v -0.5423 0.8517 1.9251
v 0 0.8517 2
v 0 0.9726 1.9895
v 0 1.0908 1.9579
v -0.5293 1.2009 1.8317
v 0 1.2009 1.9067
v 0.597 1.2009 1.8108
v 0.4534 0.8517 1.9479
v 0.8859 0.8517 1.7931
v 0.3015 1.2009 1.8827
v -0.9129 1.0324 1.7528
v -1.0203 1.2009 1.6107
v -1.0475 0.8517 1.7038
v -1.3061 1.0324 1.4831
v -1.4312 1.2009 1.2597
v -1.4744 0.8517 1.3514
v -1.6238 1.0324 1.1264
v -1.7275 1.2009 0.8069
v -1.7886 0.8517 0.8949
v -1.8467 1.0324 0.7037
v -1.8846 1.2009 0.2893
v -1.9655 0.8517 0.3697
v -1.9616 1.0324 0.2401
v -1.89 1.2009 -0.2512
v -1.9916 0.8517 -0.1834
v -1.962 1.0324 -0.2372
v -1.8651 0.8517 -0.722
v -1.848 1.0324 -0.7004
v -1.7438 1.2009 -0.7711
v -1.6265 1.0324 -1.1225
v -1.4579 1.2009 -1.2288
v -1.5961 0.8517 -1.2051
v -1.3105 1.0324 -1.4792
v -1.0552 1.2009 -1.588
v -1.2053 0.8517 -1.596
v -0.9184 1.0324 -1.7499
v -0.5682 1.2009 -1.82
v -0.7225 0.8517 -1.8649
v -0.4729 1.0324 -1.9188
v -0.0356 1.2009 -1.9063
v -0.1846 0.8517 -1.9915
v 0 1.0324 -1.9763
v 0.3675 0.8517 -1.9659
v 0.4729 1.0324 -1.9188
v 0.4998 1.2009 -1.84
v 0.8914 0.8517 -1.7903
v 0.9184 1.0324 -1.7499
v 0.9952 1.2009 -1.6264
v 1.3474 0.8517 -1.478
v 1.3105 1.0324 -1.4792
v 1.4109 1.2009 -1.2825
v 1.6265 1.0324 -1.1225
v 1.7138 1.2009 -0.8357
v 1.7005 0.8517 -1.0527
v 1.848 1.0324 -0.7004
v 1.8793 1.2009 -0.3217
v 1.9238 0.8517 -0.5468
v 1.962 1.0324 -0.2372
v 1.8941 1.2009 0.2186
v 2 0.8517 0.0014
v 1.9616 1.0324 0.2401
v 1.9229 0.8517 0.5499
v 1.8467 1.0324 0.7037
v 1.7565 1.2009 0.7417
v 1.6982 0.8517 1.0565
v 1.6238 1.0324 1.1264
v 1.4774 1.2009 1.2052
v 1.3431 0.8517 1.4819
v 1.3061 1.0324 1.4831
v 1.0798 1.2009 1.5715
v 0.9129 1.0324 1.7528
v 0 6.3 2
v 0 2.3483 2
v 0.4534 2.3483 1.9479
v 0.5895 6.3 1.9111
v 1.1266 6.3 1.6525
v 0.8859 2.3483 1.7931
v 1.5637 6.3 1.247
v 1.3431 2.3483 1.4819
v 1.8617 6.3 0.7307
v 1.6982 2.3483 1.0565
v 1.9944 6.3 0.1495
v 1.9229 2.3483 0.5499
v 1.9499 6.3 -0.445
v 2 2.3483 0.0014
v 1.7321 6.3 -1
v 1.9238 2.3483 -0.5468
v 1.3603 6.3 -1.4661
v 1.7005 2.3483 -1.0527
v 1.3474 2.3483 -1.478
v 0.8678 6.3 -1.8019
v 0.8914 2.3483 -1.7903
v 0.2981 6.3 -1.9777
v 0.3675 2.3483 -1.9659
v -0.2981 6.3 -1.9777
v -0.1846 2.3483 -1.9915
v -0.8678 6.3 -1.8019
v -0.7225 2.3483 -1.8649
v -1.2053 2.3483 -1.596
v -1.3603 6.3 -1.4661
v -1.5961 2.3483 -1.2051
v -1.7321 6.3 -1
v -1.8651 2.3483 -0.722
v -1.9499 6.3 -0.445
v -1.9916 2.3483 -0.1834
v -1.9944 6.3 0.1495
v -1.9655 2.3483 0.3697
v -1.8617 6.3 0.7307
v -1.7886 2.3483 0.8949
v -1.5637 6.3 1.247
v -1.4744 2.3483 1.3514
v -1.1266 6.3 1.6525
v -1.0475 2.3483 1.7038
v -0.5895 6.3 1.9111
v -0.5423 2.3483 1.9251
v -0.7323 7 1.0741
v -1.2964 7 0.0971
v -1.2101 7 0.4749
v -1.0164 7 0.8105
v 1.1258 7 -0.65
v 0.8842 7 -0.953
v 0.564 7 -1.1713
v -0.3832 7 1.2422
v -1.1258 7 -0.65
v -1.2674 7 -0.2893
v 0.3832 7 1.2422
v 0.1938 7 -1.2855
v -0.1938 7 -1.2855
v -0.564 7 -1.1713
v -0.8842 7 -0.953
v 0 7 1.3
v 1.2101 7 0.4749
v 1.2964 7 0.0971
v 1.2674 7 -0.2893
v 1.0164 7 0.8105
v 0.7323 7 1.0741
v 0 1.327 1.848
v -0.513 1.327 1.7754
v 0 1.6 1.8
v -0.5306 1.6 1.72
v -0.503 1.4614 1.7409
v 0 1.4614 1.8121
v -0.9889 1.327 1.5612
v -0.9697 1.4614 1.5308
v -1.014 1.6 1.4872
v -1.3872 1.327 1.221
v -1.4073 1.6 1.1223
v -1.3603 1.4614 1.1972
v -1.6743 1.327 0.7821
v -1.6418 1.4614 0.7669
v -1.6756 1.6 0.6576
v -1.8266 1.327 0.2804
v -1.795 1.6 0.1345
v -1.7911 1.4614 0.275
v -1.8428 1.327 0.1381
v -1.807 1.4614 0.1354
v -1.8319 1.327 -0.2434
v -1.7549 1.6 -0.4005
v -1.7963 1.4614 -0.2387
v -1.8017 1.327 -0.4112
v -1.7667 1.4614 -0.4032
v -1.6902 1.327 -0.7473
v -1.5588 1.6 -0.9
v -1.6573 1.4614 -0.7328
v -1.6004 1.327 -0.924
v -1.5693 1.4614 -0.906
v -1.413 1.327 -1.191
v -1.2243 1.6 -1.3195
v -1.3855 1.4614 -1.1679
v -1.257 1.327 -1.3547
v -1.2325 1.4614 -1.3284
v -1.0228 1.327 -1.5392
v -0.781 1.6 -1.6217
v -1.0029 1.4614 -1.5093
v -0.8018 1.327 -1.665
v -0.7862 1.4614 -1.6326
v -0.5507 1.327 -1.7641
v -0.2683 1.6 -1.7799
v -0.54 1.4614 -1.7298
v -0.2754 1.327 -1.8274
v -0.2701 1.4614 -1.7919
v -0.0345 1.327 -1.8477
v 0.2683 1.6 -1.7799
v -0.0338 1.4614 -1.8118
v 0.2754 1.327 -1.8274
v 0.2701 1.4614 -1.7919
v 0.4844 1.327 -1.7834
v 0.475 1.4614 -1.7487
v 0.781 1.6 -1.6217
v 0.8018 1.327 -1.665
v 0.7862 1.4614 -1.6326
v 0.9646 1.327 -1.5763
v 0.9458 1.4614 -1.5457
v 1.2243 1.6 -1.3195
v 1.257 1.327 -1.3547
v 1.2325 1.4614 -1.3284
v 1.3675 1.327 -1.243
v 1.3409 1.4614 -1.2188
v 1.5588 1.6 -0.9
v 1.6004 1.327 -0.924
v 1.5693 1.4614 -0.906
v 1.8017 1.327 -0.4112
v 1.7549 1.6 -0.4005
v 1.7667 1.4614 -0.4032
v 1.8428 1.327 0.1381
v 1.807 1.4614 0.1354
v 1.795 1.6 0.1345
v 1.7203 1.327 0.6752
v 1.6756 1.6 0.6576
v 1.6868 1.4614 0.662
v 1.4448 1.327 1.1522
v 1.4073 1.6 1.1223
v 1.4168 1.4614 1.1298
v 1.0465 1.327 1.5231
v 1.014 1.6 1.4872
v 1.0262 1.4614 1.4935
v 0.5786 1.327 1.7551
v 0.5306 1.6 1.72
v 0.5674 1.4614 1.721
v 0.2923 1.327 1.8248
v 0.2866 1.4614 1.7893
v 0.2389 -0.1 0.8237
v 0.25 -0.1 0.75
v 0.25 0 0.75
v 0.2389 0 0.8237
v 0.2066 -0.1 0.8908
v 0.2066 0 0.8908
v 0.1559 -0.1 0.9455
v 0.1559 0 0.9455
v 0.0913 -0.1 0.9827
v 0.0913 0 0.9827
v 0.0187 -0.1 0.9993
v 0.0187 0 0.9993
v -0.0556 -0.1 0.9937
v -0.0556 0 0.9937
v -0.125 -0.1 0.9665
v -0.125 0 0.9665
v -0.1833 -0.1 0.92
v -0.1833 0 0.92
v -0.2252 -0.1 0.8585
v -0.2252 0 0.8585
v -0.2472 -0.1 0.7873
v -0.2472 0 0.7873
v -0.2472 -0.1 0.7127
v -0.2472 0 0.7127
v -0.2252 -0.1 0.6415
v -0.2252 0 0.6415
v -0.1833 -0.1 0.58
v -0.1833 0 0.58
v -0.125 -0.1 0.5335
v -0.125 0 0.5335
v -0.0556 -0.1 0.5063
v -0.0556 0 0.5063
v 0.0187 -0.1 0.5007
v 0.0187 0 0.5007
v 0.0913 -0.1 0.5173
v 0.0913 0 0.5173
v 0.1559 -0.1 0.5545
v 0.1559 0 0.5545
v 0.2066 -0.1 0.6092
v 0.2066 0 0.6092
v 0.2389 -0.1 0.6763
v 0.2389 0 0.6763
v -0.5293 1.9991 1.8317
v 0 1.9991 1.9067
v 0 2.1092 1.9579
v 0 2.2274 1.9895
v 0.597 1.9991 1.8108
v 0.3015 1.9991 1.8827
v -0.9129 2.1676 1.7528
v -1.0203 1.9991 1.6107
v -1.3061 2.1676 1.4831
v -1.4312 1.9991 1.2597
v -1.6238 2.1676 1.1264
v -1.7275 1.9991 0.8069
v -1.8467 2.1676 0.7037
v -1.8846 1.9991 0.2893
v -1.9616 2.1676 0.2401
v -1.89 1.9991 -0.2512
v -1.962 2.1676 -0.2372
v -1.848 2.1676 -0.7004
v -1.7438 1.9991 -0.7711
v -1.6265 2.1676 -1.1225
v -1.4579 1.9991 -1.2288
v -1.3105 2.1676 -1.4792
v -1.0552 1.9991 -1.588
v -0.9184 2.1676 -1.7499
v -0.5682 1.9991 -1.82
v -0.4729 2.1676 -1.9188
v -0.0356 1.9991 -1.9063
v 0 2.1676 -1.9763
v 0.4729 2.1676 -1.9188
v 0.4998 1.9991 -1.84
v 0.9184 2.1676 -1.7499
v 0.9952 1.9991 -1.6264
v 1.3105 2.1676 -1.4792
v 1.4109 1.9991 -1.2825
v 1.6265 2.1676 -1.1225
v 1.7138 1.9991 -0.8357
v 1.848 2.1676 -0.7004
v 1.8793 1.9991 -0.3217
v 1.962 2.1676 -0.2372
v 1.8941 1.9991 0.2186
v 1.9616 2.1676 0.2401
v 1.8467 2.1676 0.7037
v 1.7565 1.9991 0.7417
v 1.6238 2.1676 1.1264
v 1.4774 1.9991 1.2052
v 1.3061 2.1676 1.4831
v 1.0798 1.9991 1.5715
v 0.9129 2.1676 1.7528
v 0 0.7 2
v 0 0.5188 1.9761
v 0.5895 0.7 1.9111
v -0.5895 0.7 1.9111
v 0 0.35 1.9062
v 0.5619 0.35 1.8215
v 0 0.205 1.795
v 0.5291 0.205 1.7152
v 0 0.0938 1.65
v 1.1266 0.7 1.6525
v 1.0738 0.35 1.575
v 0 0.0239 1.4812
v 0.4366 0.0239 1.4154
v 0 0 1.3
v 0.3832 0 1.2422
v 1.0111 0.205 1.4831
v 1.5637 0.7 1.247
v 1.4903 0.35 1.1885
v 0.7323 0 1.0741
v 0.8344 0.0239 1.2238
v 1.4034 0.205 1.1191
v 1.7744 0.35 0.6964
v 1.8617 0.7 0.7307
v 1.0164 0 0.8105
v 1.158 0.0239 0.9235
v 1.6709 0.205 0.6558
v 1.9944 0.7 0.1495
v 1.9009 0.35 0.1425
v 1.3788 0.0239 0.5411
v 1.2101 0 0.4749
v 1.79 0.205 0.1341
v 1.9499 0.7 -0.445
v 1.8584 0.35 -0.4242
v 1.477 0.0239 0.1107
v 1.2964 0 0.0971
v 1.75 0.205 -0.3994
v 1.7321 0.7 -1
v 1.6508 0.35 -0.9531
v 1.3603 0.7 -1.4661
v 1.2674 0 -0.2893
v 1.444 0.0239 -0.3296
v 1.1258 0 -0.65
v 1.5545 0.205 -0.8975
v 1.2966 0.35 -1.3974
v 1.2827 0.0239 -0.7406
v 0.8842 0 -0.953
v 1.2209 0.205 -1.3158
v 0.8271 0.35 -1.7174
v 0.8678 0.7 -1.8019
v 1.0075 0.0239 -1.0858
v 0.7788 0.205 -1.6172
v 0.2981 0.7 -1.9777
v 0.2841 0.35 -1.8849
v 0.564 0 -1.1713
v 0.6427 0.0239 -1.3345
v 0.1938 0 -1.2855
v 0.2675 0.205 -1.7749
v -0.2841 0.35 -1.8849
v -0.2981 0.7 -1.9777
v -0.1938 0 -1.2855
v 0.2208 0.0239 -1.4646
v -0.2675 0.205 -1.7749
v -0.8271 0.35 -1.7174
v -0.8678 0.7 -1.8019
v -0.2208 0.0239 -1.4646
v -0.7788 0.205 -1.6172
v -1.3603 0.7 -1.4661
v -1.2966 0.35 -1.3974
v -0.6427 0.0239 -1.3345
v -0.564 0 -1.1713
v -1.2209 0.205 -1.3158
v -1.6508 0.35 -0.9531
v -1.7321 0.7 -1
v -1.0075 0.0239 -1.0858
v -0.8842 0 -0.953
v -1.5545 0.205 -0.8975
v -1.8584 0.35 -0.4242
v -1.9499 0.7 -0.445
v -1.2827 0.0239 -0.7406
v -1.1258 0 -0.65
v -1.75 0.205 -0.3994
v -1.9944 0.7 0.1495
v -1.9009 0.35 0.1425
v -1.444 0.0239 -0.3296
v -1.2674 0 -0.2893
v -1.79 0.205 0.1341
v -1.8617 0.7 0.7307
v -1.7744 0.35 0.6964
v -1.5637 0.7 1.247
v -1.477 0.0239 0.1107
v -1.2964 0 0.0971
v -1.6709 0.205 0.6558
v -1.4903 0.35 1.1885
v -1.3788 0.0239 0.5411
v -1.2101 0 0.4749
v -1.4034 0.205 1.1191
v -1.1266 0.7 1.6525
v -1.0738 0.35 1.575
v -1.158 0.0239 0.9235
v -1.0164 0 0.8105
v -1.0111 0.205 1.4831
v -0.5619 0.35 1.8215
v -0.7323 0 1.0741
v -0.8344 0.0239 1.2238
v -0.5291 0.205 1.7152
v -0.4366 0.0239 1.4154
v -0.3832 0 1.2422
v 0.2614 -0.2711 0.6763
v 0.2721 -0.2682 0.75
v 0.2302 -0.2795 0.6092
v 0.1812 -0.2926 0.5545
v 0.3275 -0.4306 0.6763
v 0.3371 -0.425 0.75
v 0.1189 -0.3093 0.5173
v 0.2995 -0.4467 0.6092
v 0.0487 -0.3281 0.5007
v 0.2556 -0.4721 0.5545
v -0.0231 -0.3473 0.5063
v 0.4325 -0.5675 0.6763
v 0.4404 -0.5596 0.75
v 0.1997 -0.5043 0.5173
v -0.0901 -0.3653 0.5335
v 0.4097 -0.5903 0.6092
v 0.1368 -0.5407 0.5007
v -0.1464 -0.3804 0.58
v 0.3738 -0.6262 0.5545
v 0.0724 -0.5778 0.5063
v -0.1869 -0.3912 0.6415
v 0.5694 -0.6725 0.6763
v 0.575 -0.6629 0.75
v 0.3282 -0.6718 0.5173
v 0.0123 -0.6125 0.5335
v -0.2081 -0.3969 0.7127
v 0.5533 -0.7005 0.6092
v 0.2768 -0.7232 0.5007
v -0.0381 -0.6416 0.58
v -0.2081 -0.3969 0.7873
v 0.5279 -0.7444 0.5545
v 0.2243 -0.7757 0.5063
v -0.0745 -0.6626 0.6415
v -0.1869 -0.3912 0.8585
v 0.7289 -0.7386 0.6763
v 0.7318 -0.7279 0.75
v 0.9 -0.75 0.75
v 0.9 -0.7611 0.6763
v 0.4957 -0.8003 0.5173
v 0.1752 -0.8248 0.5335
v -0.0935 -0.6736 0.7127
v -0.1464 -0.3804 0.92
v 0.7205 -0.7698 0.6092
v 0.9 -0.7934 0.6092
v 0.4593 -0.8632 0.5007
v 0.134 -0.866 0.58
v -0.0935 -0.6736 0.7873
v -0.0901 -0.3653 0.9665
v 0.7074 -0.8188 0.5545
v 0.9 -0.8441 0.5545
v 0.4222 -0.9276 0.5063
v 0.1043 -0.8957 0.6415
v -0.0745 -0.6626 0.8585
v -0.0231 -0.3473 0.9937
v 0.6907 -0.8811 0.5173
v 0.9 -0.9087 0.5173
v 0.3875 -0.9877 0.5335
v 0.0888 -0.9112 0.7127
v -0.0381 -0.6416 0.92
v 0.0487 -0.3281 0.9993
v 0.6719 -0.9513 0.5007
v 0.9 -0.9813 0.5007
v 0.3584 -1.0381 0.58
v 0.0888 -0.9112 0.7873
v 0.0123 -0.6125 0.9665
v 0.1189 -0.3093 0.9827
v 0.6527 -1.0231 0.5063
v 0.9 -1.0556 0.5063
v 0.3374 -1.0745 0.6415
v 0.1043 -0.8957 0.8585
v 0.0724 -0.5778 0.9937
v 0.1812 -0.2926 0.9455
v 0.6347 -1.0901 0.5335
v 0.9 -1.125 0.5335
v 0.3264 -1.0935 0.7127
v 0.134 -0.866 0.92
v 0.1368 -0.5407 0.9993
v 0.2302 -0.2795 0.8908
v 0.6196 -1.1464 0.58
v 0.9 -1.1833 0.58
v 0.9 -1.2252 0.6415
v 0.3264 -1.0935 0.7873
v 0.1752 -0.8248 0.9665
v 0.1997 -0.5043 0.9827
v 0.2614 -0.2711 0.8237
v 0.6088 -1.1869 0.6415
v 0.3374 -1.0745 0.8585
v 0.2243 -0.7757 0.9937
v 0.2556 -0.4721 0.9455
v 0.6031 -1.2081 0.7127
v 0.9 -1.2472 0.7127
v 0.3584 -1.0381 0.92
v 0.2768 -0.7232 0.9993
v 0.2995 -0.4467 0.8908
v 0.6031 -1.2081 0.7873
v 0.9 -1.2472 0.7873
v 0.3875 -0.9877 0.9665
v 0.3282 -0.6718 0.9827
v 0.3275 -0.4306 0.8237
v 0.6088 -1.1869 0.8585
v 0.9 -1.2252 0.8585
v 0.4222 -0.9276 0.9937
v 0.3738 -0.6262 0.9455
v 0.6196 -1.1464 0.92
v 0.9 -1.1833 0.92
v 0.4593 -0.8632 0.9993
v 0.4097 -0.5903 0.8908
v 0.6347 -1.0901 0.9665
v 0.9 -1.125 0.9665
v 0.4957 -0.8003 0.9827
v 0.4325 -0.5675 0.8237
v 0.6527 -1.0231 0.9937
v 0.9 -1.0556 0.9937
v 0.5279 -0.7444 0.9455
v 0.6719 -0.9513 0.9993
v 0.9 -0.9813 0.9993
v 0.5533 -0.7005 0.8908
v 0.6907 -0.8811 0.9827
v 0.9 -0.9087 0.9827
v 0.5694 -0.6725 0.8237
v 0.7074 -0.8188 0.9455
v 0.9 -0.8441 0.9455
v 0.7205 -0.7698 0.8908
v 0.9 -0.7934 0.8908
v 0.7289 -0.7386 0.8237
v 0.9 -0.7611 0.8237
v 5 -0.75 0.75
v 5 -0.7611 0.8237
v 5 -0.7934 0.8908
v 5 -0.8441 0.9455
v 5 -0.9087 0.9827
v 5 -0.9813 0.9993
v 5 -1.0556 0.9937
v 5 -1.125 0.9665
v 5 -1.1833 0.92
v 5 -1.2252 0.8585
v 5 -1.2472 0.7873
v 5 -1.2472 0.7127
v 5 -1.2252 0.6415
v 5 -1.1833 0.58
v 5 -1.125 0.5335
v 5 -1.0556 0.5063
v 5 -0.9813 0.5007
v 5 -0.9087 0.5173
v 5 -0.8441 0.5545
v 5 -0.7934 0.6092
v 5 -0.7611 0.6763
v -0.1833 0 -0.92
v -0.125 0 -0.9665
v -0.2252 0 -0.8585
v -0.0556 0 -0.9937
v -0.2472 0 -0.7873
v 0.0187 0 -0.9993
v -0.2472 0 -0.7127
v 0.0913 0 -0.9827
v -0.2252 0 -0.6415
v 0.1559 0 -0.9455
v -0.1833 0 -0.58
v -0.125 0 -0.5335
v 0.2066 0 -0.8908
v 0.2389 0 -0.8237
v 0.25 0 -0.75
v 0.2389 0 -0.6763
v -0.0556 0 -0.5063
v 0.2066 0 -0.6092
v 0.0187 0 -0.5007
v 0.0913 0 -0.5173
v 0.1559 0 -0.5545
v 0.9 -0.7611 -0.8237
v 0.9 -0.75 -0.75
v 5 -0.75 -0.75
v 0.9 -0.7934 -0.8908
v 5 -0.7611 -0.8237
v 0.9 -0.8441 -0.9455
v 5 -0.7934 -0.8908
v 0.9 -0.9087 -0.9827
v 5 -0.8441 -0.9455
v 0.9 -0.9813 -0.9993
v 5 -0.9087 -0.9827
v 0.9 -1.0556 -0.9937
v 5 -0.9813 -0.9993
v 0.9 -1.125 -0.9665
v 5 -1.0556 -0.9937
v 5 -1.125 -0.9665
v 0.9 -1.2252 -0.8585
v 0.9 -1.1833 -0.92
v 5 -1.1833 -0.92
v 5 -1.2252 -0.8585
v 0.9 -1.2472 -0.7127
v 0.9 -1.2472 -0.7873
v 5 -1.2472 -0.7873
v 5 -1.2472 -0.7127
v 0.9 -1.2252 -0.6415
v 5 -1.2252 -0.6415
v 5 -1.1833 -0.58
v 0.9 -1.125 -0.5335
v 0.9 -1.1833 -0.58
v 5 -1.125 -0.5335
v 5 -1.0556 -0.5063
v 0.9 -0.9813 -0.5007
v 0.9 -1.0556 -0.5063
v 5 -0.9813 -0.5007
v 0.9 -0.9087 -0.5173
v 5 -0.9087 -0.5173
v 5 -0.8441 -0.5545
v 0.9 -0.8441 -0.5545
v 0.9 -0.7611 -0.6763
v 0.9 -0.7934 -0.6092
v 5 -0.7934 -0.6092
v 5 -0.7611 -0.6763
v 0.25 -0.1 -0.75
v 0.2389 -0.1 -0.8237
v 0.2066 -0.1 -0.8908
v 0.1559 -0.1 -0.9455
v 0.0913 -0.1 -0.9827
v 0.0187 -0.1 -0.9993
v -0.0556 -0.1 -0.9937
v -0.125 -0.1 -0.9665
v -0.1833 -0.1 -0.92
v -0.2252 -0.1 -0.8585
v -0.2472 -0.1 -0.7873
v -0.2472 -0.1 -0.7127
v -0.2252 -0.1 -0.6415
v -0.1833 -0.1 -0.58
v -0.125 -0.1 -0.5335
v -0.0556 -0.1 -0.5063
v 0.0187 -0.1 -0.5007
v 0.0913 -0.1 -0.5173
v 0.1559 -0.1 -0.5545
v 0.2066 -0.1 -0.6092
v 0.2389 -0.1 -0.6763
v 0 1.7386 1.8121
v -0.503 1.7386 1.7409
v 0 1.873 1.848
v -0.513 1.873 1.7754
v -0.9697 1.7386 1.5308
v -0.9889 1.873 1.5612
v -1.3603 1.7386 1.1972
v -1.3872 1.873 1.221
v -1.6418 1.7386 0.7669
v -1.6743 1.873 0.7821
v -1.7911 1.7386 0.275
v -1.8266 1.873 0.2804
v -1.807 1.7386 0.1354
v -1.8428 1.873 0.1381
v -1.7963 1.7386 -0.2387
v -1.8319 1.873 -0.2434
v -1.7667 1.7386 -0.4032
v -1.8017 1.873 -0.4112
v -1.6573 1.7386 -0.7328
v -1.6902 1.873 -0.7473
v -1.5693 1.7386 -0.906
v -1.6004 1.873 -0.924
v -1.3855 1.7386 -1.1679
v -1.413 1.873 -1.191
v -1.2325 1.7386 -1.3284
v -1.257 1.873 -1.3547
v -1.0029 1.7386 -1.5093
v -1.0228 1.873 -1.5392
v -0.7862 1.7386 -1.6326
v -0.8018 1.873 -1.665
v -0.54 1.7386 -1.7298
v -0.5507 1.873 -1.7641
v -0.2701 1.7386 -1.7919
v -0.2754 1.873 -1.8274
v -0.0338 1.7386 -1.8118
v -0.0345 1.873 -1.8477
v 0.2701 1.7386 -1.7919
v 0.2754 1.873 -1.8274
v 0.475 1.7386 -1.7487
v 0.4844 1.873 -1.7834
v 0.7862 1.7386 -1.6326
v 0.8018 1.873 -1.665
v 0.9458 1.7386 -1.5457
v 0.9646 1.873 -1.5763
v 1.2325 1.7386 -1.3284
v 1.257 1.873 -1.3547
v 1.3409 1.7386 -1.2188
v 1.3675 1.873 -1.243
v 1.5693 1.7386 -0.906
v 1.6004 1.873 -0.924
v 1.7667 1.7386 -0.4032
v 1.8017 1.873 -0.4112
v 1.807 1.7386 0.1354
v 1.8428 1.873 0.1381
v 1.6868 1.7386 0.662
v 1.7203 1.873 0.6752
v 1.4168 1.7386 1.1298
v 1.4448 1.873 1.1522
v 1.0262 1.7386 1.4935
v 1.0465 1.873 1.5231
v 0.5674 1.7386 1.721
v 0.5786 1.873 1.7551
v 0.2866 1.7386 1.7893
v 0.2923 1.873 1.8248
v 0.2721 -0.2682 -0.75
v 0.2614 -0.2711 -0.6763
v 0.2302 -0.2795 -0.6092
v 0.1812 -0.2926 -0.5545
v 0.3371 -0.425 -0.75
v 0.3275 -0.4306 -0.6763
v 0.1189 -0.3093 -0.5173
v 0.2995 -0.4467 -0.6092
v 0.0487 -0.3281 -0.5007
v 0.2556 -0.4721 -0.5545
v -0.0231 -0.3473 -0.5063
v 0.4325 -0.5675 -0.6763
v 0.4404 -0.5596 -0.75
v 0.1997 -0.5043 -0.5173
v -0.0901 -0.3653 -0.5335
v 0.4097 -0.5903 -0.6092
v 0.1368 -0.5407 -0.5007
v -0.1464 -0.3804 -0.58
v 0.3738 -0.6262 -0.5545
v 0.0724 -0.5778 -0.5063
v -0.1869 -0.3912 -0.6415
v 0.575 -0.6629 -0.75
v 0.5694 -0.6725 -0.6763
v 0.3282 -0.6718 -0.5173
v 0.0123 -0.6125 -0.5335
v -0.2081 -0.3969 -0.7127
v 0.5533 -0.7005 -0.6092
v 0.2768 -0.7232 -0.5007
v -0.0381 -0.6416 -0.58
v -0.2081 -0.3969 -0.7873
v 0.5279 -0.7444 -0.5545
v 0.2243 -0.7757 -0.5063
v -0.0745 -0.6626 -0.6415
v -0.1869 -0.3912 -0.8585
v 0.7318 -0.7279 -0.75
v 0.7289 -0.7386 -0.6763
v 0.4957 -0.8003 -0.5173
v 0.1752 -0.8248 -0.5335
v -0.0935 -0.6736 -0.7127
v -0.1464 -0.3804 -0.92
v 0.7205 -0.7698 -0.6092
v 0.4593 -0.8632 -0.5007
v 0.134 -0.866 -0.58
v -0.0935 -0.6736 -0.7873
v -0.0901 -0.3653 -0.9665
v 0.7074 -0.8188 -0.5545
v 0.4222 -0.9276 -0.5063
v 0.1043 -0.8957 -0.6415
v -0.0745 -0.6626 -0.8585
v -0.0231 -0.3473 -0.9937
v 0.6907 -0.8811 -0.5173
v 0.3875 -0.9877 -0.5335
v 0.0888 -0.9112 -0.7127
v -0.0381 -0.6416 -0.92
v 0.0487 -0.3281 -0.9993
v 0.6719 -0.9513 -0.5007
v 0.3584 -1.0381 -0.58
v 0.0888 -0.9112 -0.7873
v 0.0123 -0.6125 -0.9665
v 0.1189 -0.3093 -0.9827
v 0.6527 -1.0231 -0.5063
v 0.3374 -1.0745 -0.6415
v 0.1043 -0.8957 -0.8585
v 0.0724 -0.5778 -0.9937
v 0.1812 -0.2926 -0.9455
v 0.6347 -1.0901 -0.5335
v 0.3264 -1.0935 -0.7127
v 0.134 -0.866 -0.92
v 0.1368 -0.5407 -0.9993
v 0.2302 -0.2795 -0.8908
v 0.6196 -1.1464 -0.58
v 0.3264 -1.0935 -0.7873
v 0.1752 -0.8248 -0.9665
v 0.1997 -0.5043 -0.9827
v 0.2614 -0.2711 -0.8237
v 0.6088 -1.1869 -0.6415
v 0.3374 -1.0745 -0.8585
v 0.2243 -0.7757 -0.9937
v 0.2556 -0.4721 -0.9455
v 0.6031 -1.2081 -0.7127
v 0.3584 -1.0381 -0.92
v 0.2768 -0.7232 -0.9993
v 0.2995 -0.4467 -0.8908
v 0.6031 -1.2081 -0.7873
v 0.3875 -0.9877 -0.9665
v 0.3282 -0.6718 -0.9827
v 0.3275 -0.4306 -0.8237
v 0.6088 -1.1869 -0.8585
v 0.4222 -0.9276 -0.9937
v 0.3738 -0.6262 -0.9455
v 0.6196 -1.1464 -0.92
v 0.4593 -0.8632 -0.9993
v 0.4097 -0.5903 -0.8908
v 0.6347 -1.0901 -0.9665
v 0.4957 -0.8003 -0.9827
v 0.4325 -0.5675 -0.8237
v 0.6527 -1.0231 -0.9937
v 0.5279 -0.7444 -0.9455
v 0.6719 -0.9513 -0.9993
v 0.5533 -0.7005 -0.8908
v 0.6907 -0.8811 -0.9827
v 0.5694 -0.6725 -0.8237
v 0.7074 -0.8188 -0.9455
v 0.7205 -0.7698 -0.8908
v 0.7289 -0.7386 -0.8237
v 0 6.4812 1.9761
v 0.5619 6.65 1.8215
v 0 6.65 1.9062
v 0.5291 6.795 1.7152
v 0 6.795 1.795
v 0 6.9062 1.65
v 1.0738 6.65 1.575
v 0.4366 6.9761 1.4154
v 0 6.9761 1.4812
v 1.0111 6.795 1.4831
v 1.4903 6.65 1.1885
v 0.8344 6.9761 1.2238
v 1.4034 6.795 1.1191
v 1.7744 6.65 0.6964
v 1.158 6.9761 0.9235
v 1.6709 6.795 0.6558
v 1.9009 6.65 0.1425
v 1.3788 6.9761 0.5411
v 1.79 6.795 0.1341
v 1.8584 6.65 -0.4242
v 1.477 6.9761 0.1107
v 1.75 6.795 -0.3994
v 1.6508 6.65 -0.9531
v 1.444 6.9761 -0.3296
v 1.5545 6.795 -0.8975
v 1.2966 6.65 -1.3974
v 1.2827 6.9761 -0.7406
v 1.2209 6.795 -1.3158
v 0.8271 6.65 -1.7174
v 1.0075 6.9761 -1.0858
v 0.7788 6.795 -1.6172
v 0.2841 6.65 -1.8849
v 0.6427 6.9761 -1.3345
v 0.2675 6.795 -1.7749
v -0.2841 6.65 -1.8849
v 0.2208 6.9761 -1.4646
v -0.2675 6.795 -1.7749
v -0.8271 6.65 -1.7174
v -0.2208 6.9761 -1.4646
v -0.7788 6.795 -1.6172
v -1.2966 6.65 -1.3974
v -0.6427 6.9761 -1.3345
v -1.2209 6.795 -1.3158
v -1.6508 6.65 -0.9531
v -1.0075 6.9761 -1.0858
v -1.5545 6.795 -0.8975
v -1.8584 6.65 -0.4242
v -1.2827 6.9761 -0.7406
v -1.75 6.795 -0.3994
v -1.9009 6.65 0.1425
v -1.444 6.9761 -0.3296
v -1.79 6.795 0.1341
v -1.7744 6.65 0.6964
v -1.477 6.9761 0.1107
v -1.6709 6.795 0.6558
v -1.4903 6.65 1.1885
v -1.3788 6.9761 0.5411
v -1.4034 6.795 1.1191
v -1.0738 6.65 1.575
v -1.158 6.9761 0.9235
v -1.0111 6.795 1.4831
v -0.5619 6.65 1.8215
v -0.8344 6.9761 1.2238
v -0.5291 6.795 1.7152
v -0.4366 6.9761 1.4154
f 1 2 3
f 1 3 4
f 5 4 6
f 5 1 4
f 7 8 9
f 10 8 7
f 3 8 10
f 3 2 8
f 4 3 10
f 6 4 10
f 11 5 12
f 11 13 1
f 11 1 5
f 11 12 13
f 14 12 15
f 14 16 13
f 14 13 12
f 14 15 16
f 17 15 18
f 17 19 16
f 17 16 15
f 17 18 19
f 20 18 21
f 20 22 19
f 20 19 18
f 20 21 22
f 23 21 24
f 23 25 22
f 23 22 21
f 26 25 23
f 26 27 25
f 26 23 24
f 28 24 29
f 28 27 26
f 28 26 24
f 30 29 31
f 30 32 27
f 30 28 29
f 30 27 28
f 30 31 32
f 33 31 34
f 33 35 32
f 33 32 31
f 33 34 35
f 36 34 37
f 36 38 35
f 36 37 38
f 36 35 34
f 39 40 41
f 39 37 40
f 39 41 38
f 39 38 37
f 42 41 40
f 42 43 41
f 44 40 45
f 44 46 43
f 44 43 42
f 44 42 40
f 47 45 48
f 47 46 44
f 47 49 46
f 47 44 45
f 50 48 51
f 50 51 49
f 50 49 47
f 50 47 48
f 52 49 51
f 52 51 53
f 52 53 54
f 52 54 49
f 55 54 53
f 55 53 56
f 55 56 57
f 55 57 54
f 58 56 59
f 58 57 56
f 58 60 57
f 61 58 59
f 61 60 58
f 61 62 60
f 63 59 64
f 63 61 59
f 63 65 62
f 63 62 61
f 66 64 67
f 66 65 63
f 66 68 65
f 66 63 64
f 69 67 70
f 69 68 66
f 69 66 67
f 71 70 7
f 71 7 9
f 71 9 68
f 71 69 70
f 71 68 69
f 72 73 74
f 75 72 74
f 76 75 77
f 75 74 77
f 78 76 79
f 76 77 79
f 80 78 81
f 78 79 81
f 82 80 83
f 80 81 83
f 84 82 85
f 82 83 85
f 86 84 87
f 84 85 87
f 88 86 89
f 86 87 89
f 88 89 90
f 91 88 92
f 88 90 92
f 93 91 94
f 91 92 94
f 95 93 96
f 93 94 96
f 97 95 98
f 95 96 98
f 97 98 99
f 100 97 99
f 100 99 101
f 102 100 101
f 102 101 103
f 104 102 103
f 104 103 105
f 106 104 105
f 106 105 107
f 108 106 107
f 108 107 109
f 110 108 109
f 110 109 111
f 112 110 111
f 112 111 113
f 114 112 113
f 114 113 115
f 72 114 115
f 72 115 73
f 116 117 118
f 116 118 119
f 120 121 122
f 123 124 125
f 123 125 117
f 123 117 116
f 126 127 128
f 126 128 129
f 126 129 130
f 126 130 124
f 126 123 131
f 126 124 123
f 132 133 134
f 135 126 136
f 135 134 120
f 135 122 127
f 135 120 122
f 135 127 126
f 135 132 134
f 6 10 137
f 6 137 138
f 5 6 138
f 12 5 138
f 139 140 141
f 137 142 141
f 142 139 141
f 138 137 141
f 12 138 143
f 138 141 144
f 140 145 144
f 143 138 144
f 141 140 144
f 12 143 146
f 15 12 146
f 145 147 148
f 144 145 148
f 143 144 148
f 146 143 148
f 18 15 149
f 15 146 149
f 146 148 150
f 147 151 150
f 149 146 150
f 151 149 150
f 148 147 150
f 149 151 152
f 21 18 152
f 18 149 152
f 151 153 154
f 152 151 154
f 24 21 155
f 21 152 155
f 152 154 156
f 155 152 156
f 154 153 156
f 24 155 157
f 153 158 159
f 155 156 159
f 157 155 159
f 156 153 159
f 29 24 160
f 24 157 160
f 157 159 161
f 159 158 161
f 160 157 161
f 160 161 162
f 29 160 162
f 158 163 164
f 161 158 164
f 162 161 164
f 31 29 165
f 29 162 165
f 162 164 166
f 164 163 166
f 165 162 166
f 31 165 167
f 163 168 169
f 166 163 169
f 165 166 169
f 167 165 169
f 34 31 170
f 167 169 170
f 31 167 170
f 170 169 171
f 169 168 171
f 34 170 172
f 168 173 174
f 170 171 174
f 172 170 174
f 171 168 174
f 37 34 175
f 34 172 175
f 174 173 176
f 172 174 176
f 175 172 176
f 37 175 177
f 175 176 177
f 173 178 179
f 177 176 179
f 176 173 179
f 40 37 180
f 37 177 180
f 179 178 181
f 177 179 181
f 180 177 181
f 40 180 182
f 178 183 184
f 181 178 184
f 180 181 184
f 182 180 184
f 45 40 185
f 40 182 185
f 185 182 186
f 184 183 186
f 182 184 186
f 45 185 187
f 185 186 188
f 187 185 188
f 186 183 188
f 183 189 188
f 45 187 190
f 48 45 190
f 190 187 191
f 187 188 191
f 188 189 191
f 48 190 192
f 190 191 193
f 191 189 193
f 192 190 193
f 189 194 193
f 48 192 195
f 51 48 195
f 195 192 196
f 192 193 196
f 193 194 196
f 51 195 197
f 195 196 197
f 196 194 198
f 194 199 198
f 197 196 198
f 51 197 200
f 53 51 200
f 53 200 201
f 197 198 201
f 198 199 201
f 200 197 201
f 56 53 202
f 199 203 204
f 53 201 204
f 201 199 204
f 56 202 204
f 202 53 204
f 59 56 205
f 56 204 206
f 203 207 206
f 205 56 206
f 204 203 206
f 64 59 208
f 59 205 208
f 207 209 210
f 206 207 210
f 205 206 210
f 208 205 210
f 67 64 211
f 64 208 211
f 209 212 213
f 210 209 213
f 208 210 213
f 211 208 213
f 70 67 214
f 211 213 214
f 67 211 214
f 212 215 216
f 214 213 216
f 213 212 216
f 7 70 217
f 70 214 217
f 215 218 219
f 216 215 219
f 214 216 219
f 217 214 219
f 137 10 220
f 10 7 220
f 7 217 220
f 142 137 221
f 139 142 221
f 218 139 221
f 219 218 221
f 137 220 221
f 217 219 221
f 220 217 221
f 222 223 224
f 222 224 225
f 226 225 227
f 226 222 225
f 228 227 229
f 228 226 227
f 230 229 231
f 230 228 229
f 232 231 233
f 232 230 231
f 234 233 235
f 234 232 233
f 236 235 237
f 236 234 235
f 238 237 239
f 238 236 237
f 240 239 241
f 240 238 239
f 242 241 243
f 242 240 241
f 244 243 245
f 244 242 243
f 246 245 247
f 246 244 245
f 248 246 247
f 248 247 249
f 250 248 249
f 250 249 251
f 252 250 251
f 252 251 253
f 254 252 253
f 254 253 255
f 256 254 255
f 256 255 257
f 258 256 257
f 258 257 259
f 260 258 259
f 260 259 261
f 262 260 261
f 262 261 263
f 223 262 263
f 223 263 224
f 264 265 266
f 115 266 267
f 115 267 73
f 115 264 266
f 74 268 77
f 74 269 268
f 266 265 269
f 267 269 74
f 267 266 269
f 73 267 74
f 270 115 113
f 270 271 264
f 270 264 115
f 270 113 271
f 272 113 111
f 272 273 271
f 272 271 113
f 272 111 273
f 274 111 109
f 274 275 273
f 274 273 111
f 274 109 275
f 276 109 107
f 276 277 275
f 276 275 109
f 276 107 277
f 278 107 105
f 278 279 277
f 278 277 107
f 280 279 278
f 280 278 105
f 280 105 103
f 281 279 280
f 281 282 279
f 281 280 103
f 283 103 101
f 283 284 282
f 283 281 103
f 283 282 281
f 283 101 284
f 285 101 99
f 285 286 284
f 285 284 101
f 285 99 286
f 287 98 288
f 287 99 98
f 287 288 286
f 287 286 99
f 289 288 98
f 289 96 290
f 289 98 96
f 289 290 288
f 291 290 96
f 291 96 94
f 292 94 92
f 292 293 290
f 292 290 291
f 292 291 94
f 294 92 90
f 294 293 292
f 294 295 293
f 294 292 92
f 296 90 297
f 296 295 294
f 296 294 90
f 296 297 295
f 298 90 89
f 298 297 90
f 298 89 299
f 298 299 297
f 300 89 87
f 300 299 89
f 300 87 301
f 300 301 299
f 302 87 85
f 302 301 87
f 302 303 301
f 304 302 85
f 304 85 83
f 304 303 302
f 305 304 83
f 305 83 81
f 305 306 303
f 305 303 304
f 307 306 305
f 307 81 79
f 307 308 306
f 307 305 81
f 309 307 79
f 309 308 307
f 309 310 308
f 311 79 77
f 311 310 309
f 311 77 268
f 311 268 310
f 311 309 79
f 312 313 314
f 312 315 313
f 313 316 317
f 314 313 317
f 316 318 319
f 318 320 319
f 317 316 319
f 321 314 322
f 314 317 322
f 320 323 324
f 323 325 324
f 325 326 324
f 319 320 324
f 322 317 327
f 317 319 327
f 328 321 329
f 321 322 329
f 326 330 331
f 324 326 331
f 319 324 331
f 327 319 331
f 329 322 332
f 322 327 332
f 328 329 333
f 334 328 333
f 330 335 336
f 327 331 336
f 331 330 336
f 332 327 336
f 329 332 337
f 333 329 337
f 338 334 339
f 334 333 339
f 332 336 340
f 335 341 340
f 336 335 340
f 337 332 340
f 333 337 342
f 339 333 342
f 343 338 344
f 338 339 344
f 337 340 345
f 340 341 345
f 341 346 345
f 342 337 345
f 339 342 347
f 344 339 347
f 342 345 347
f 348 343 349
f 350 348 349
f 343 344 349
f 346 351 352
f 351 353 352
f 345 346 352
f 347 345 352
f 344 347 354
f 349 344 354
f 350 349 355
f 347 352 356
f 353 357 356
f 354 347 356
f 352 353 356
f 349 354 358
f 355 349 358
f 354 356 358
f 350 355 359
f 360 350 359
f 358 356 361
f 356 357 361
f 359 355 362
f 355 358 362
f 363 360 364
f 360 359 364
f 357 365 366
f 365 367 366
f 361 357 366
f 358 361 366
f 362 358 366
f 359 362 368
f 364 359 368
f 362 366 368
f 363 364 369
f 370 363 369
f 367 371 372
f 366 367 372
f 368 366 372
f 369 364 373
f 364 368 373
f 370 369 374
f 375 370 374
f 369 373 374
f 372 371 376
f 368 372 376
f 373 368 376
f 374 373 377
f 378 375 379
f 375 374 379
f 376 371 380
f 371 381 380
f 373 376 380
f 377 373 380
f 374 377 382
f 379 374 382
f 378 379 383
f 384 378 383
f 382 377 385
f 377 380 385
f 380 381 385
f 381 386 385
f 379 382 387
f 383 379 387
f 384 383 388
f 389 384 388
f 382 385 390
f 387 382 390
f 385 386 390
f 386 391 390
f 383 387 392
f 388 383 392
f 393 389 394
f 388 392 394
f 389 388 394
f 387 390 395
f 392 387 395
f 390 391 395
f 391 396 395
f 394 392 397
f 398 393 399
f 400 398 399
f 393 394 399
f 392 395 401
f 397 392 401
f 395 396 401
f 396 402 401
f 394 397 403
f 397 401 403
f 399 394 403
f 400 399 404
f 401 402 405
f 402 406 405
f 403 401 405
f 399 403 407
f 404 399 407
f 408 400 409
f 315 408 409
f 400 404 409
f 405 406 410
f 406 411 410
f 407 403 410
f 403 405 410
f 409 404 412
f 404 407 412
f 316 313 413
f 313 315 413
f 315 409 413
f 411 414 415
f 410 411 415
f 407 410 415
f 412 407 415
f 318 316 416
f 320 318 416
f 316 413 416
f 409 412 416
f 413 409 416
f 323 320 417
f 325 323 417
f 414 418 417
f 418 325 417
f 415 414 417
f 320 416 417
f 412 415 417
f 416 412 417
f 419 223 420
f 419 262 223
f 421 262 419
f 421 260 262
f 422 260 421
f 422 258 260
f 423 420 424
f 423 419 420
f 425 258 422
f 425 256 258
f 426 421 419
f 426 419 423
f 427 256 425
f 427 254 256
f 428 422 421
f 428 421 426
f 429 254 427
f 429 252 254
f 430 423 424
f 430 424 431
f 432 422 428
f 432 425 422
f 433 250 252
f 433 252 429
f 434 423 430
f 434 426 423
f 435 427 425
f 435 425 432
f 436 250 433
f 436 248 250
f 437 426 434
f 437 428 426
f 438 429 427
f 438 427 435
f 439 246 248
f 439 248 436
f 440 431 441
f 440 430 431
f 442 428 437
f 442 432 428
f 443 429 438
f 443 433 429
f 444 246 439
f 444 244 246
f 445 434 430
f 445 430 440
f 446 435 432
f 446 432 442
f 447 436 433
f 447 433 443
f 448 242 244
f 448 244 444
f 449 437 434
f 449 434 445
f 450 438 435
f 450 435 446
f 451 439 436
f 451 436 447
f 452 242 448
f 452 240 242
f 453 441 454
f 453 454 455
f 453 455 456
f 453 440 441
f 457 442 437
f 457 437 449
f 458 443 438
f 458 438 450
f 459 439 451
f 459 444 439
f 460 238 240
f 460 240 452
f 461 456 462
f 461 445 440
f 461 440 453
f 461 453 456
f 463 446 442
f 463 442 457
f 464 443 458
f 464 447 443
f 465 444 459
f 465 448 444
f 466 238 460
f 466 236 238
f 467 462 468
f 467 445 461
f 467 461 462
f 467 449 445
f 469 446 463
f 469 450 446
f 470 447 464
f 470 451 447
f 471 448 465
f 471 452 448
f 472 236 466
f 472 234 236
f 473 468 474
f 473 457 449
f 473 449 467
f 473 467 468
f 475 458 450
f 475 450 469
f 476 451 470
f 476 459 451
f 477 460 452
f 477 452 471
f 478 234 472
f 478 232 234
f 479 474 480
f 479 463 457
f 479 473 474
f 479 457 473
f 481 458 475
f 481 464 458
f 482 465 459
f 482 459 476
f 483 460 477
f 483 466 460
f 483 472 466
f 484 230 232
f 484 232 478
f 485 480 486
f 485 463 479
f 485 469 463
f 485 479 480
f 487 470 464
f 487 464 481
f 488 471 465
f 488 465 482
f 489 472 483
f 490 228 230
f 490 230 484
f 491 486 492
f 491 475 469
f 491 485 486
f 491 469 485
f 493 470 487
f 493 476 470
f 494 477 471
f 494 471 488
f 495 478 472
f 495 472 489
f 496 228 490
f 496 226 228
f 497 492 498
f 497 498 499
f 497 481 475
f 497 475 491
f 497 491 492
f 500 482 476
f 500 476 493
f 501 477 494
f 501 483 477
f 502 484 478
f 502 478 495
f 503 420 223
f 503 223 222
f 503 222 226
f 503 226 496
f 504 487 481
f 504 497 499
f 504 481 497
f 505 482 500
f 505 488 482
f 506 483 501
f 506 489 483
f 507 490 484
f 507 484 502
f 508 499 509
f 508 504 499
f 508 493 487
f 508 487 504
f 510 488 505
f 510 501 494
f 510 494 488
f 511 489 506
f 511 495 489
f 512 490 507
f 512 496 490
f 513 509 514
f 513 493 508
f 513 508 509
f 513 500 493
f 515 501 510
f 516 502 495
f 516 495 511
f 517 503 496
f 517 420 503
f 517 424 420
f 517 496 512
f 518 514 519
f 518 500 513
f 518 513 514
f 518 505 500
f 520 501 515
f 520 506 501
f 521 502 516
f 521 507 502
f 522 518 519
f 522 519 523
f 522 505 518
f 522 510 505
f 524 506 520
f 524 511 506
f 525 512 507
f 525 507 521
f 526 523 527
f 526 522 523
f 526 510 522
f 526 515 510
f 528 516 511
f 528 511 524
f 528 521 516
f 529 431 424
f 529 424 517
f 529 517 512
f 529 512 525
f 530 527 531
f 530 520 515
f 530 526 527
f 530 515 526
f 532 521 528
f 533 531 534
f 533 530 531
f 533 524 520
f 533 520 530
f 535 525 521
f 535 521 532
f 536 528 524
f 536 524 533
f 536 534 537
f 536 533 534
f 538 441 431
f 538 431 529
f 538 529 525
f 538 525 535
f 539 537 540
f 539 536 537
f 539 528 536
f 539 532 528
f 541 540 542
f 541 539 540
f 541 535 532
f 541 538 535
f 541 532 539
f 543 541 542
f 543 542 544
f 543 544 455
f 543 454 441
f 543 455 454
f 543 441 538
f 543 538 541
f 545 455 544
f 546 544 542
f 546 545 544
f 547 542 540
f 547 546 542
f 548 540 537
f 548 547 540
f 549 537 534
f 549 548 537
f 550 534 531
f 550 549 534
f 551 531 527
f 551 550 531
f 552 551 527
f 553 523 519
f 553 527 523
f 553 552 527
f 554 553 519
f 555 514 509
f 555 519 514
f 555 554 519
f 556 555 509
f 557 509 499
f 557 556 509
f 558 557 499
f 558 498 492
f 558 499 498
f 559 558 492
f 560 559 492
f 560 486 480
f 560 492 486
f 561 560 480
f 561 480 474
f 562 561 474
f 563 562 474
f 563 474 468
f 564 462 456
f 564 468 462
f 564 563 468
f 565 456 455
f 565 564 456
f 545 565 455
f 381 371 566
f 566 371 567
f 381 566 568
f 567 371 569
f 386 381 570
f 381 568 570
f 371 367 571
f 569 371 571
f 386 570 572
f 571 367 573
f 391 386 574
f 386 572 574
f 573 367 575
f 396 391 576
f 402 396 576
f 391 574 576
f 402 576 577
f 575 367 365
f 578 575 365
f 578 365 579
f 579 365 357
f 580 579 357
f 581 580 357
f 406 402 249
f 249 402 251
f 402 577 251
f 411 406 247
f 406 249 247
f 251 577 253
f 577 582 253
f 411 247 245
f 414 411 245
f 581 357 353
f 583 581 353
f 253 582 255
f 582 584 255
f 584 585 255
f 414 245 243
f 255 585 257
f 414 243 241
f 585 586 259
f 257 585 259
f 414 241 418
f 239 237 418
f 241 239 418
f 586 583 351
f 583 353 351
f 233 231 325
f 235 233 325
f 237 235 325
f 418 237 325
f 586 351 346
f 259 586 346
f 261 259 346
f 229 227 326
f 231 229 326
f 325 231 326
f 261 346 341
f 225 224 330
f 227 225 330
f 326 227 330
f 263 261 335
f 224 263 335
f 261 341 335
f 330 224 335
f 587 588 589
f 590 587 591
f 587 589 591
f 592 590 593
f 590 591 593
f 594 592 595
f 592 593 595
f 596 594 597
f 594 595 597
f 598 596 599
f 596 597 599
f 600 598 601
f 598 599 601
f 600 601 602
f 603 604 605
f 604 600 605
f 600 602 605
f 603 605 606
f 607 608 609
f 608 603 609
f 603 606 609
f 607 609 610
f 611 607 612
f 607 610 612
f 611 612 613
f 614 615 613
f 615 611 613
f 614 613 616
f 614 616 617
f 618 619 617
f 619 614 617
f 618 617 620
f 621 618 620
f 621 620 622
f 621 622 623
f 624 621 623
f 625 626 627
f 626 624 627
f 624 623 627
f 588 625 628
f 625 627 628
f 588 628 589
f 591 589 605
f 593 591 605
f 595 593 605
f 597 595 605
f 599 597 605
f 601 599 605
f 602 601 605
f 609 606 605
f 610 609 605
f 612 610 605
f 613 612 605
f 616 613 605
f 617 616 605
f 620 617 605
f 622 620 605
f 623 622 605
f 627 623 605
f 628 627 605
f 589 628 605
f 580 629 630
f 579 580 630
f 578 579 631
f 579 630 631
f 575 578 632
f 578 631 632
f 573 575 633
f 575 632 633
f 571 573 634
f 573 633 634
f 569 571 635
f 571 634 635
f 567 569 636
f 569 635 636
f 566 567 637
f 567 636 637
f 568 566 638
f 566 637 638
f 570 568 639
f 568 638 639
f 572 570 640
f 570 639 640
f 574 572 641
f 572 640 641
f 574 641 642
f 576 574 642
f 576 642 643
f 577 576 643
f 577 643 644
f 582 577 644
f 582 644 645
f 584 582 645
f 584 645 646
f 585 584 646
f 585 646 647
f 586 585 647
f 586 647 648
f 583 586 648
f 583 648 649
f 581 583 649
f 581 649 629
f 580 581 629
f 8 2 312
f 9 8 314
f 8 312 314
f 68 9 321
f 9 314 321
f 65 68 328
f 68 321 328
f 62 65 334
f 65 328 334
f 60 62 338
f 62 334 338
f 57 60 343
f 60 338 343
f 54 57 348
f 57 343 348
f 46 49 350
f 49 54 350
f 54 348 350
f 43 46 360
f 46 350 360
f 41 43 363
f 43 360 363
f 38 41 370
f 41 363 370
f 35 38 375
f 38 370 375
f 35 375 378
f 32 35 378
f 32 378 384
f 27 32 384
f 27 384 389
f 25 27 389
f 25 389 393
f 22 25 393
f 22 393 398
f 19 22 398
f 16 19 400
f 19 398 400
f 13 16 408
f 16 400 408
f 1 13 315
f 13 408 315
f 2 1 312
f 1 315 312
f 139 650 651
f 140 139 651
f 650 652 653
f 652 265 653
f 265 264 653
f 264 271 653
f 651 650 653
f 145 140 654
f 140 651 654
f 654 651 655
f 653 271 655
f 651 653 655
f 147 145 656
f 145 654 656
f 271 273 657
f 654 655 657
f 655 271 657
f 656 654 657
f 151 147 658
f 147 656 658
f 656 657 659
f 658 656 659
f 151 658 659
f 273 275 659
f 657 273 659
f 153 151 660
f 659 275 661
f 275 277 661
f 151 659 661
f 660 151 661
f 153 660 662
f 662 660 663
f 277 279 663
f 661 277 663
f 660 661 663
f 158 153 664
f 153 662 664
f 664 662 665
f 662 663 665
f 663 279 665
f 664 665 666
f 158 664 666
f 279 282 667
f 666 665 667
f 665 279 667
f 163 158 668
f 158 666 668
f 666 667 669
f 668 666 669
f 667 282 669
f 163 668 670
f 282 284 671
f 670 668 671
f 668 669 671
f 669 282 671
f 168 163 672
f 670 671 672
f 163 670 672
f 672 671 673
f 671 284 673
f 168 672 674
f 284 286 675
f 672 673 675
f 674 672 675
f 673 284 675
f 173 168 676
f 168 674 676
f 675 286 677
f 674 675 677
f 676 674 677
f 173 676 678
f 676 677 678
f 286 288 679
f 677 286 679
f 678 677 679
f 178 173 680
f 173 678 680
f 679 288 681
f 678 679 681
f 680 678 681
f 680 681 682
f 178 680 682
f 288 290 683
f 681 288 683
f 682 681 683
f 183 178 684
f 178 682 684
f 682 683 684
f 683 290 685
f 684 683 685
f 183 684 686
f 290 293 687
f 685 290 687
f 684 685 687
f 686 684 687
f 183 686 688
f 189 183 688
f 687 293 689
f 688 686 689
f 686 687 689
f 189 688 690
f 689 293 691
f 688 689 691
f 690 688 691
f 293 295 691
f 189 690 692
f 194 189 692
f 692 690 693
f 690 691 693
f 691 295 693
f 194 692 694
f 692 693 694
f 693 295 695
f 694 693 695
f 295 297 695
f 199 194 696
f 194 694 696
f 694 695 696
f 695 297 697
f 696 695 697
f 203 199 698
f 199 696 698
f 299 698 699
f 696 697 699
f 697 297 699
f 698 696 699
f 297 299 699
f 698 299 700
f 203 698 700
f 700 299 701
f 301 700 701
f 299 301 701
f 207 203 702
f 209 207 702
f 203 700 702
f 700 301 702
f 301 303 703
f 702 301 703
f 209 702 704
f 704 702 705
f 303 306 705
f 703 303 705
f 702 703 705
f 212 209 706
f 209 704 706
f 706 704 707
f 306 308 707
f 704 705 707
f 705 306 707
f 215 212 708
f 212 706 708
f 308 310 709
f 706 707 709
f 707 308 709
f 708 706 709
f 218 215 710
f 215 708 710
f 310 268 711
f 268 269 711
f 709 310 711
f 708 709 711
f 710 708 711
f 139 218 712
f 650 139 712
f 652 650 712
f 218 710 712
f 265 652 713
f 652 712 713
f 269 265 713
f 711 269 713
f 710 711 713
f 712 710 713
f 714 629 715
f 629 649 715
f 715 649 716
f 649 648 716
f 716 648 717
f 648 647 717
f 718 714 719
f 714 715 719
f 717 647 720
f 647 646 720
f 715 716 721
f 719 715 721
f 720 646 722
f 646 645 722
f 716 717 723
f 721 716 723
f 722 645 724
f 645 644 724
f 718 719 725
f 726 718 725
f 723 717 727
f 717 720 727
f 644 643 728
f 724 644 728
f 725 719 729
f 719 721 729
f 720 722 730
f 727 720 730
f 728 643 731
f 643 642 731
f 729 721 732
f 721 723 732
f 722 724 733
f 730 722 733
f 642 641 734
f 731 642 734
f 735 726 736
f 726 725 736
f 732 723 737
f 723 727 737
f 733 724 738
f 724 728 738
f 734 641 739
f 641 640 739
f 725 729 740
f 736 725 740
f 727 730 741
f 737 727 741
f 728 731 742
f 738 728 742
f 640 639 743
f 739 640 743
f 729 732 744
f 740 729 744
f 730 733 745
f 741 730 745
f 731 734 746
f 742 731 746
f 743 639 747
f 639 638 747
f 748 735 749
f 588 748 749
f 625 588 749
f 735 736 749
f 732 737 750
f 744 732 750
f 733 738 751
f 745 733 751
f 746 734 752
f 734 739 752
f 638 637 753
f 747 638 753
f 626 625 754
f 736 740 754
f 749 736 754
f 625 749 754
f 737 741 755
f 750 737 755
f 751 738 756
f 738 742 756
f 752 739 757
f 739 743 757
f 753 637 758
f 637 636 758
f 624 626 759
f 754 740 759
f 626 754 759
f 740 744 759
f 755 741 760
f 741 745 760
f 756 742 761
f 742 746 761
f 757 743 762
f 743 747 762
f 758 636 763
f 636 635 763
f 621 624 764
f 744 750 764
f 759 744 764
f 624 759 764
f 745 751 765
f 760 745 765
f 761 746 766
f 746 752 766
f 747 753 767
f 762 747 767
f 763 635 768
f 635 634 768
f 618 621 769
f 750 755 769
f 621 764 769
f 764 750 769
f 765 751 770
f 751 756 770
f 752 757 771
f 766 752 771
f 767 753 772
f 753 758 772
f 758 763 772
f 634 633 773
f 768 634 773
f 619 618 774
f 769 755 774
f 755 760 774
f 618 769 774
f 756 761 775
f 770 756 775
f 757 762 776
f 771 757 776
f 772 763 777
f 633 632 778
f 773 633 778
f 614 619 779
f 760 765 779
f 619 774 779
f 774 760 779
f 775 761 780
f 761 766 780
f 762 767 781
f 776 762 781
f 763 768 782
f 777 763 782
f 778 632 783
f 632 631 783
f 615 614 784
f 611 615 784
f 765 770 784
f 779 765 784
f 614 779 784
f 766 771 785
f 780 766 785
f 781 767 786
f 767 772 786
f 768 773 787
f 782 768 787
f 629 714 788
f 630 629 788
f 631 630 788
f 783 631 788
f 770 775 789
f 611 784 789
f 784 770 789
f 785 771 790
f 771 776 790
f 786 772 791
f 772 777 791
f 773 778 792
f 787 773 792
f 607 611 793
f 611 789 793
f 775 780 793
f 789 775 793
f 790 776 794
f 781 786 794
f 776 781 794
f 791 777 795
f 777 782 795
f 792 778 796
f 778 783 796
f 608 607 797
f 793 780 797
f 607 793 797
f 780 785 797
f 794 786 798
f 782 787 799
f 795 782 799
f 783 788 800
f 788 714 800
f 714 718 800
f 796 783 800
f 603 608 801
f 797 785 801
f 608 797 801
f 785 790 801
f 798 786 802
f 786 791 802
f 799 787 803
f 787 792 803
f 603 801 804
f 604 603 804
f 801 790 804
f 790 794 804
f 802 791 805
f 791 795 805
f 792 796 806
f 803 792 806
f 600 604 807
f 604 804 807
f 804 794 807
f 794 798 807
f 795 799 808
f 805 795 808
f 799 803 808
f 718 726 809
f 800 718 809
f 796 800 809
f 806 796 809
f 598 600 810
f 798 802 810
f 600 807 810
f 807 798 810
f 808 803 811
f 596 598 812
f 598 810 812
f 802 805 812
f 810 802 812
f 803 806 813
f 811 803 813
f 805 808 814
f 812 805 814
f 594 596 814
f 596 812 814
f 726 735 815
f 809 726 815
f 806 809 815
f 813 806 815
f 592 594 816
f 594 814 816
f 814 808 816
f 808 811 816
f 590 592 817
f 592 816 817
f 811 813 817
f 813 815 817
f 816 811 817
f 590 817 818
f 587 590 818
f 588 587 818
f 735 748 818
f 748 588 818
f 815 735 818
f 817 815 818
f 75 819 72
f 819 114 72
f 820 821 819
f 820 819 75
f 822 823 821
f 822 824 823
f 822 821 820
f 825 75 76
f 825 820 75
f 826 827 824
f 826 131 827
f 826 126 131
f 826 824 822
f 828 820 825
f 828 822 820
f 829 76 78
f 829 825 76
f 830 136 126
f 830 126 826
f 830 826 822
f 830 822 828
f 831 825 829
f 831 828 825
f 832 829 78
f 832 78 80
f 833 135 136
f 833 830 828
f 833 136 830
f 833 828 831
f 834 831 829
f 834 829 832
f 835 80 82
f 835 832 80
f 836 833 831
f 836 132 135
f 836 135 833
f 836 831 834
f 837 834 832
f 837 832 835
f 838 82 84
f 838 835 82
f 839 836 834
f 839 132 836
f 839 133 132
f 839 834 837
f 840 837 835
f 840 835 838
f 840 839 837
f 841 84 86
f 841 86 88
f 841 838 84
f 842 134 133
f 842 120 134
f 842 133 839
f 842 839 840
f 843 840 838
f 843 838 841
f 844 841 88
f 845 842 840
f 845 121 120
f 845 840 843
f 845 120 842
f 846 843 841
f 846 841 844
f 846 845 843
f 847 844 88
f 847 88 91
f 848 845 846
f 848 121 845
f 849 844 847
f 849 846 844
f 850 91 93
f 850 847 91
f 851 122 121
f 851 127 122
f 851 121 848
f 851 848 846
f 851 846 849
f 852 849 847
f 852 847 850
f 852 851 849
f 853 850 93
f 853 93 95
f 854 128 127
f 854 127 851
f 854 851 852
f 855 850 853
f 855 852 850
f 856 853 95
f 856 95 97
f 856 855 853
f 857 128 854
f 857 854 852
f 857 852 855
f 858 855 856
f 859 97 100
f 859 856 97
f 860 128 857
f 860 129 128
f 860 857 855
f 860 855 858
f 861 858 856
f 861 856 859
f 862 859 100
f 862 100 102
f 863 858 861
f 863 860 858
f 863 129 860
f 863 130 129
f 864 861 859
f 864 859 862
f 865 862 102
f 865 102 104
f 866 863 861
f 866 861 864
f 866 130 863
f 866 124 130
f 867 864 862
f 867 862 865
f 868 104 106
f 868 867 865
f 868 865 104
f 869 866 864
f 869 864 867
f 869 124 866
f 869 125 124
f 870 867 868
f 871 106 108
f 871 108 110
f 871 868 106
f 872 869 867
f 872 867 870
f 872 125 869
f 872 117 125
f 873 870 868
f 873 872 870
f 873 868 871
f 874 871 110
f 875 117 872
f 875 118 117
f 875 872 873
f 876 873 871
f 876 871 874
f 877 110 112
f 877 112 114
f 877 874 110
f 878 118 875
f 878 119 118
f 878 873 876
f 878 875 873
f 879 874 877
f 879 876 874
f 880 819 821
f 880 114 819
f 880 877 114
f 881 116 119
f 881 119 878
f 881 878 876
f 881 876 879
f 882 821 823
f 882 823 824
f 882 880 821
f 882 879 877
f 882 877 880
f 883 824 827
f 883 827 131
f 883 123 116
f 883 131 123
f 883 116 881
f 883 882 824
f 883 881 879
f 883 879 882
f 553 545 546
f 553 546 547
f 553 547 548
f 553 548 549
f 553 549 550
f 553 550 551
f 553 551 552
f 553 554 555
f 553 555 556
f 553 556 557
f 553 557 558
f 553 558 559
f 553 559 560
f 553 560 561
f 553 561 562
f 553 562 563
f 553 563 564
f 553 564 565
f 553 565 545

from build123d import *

# Parameters (mm, degrees)
SKETCH_1_R      = 2
EXTRUDE_1_DEPTH = 7
SKETCH_2_R      = 0.25
FILLET_1_R      = 0.7
FILLET_2_R      = 0.7
SKETCH_3_R      = 0.8
FILLET_3_R      = 0.7
FILLET_4_R      = 0.7


with BuildPart() as part:
    # Эскиз1 → Бобышка-Вытянуть1 (new body)
    with BuildSketch(Plane(origin=(0, 0, 0), x_dir=(1, 0, 0), z_dir=(0, 1, 0))):
        with Locations(Location((0, 0, 0), (0, 0, 270))):
            Circle(SKETCH_1_R)
    extrude(amount=EXTRUDE_1_DEPTH)

    # По траектории1: sweep along a curve in space
    with BuildLine() as sweep_1_path:
        Line((0, 0, 0.75), (0, -0.1, 0.75))
        ThreePointArc((0, -0.1, 0.75), (0.263603897, -0.736396103, 0.75), (0.9, -1, 0.75))
        Line((0.9, -1, 0.75), (5, -1, 0.75))
    # Эскиз2 → По траектории1 (sweep)
    with BuildSketch(Plane.XZ):
        with Locations((0, 0.75)):
            Circle(SKETCH_2_R)
    sweep_1 = sweep(path=sweep_1_path.line)

    # Зеркальное отражение1: По траектории1 across plane
    add(sweep_1.mirror(Plane.XY))

    # Скругление1
    fillet_1_edges = [part.edges().sort_by_distance(p)[0] for p in [
        (0, 0, -2),
    ]]
    fillet(fillet_1_edges, radius=FILLET_1_R)

    # Скругление2
    fillet_2_edges = [part.edges().sort_by_distance(p)[0] for p in [
        (0, 7, -2),
    ]]
    fillet(fillet_2_edges, radius=FILLET_2_R)

    # Эскиз3 → Вырез-Повернуть1 (revolve, cut)
    with BuildSketch(Plane(origin=(0, 0, 0), x_dir=(0, 0, -1), z_dir=(1, 0, 0))):
        with Locations((-2.6, 1.6)):
            Circle(SKETCH_3_R)
    revolve(axis=Axis((0, 0, 0), (0, -1, 0)), mode=Mode.SUBTRACT)

    # Скругление3
    fillet_3_edges = [part.edges().sort_by_distance(p)[0] for p in [
        (0, 1.070849738, -2),
    ]]
    fillet(fillet_3_edges, radius=FILLET_3_R)

    # Скругление4
    fillet_4_edges = [part.edges().sort_by_distance(p)[0] for p in [
        (0, 2.129150262, -2),
    ]]
    fillet(fillet_4_edges, radius=FILLET_4_R)


solid = part.part
